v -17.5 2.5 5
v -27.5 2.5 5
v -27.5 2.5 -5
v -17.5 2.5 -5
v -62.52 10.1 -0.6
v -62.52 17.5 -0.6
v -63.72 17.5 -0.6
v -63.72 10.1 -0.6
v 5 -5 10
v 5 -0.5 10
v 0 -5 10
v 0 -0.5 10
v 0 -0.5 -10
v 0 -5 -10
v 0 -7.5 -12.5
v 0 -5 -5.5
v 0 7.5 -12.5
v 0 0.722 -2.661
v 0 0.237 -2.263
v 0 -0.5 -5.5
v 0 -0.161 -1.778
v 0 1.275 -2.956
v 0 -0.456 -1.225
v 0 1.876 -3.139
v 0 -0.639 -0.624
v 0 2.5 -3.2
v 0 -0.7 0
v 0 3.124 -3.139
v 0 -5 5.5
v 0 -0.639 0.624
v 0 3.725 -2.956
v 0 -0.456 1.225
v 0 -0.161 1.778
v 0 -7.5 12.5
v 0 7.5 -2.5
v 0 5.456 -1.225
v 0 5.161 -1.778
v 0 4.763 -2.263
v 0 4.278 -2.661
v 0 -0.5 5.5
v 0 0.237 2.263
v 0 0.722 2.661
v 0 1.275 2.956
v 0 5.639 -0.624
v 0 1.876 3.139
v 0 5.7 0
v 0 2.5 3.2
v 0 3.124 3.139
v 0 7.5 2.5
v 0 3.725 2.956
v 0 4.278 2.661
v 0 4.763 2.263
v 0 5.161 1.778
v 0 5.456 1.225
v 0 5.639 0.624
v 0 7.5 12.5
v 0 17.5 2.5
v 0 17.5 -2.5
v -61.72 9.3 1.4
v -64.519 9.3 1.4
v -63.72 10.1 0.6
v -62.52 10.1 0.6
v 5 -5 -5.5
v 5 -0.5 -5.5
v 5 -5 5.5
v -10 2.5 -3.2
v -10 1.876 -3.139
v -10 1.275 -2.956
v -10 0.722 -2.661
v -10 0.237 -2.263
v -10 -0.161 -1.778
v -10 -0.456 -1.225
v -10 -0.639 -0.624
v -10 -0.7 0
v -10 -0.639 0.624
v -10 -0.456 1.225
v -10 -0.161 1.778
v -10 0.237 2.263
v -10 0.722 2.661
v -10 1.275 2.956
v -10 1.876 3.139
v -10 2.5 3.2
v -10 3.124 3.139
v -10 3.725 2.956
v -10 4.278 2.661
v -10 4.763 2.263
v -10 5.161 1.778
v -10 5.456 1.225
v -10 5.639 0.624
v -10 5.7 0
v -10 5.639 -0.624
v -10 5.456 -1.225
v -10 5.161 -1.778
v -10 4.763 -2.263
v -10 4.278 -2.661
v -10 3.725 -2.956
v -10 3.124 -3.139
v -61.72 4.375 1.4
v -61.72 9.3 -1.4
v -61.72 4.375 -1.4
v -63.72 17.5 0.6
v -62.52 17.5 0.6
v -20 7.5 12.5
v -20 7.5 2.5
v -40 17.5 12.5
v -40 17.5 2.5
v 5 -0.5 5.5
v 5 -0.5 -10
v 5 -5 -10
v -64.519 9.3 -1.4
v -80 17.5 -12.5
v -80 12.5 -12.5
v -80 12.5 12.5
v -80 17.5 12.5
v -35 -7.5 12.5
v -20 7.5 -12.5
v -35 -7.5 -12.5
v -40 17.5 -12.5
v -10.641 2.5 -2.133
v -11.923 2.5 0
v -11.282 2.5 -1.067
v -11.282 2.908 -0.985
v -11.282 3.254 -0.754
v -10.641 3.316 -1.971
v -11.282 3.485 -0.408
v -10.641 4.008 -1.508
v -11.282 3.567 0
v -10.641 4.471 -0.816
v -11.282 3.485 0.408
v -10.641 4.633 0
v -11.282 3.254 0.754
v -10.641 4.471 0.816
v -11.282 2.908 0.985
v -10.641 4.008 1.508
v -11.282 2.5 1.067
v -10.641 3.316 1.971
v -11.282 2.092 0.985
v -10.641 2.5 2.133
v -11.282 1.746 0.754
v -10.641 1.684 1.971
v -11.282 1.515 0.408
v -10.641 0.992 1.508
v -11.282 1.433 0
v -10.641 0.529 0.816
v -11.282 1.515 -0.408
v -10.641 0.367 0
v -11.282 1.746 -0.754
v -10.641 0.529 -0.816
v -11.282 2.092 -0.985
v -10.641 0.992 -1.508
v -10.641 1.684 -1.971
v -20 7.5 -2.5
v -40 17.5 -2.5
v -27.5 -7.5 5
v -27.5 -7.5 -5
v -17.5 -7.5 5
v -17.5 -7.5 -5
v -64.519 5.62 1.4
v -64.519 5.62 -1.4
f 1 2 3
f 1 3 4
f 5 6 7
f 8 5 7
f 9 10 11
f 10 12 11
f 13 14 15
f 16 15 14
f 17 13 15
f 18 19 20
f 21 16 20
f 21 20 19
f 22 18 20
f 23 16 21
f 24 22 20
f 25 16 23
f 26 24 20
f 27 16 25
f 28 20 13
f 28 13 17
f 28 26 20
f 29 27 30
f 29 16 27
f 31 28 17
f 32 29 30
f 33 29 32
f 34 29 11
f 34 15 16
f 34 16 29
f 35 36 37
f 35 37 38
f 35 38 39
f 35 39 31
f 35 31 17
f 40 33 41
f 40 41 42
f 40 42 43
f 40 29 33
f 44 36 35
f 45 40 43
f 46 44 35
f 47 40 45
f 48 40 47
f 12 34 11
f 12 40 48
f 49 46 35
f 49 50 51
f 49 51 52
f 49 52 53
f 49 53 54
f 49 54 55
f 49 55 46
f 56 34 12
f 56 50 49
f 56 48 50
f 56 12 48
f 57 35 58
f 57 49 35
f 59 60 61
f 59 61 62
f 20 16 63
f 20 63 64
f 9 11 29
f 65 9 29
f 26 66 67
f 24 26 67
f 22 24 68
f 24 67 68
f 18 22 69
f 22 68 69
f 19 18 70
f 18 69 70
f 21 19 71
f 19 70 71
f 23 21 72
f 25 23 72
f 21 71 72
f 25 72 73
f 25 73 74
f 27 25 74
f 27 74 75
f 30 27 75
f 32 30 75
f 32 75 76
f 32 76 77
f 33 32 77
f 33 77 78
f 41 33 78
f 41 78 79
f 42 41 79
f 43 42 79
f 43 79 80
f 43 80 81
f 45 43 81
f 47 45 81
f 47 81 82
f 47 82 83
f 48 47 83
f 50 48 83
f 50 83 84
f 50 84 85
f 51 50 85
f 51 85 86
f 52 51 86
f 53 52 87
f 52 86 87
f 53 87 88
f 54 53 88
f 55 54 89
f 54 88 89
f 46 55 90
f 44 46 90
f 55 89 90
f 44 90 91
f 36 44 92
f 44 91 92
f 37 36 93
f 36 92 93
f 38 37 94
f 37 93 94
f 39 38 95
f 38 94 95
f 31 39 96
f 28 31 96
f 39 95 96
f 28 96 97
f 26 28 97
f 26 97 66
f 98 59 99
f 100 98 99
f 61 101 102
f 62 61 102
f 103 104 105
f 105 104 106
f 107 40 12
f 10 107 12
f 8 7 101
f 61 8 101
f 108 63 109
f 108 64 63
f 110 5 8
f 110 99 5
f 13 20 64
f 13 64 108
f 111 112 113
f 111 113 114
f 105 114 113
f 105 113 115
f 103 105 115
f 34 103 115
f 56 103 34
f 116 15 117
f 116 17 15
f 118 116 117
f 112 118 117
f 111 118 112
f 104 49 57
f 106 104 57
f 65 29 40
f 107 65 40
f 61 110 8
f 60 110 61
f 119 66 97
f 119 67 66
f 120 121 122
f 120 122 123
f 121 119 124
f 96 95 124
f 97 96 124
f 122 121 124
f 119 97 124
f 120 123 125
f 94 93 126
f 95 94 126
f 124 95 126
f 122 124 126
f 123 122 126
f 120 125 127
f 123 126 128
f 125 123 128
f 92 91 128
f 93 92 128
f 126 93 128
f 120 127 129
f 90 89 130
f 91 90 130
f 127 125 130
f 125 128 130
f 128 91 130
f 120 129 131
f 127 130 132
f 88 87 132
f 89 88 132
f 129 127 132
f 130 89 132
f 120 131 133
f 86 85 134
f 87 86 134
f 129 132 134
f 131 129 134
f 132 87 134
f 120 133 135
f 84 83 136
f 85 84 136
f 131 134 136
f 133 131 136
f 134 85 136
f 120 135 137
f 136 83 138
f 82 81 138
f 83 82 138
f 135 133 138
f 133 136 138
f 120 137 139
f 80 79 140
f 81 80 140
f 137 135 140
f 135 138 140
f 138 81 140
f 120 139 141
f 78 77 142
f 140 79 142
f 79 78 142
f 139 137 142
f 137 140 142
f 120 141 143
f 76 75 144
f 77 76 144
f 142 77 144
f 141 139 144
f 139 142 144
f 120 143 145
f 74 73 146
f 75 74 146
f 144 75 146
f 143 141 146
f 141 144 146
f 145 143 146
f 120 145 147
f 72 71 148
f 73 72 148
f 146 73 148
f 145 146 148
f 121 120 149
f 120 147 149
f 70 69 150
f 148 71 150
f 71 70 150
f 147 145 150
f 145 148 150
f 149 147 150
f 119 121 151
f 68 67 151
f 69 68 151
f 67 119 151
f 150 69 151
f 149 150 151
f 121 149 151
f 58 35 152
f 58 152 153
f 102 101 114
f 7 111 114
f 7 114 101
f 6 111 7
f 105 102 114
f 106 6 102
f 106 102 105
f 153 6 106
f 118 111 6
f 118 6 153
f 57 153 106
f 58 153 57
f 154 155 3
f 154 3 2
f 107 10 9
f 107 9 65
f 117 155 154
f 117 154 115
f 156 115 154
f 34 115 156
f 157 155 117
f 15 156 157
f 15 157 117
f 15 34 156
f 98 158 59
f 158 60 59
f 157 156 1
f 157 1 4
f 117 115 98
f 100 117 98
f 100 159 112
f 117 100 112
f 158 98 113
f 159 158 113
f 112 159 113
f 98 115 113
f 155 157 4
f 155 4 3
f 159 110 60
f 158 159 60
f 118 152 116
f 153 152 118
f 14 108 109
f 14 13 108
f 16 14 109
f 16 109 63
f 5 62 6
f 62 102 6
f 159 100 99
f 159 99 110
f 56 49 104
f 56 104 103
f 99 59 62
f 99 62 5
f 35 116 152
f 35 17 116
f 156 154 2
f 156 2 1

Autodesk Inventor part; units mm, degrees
ref_plane "YZ Plane" through (0, 0, 0) normal (1, 0, 0) x (0, 1, 0)
ref_plane "XZ Plane" through (0, 0, 0) normal (0, 1, 0) x (-1, 0, 0)
ref_plane "XY Plane" through (0, 0, 0) normal (0, 0, 1) x (1, 0, 0)
sketch "Sketch1" plane through (0, 0, 0) normal (1, 0, 0) x (0, 1, 0)
  line L0 (-7.5, -12.5) -> (7.5, -12.5)
  line L1 (7.5, -12.5) -> (7.5, 12.5)
  line L2 (7.5, 12.5) -> (-7.5, 12.5)
  line L3 (-7.5, 12.5) -> (-7.5, -12.5)
  line L4 (-7.5, -12.5) -> (7.5, 12.5) construction
  line L5 (7.5, -12.5) -> (-7.5, 12.5) construction
  point P0 (0, 0)
  dimension "d0" = 15
  dimension "d1" = 25
extrude "Extrusion1" add sketch "Sketch1" against normal blind 80
sketch "Sketch2" plane through (0, 0, 0) normal (1, 0, 0) x (0, 0, -1)
  line L0 (-12.5, 7.5) -> (12.5, 7.5) projected
  line L1 (0, 7.5) -> (2.5, 7.5)
  line L2 (2.5, 7.5) -> (2.5, 17.5)
  line L3 (2.5, 17.5) -> (0, 17.5)
  line L4 (0, 17.5) -> (0, 7.5)
  line L5 (0, 7.5) -> (-2.5, 7.5)
  line L6 (-2.5, 7.5) -> (-2.5, 17.5)
  line L7 (-2.5, 17.5) -> (0, 17.5)
  line L8 (0, 17.5) -> (0, 7.5)
  point P0 (0, 0)
  dimension "d4" = 2.5
  dimension "d5" = 10
  dimension "d6" = 2.5
  dimension "d7" = 10
extrude "Extrusion2" add sketch "Sketch2" against normal blind 80
sketch "Sketch4" plane through (0, 7.5, -2.5) normal (0, 0, -1) x (-1, 0, 0)
  line L0 (80, -15) -> (80, 0) projected
  line L1 (80, 0) -> (40, 0)
  line L2 (40, 0) -> (40, 10)
  line L3 (40, 10) -> (80, 10)
  line L4 (80, 10) -> (80, 0)
  point P0 (0, -7.5)
  dimension "d12" = 40
extrude "Extrusion3" add sketch "Sketch4" along normal blind 10
sketch "Sketch5" plane through (0, 7.5, -2.5) normal (0, 0, -1) x (-1, 0, 0)
  line L0 (0, 0) -> (80, 0) projected
  line L1 (40, 0) -> (20, 0)
  line L2 (20, 0) -> (40, 10)
  line L3 (40, 10) -> (40, 0)
  point P0 (0, -7.5)
  dimension "d15" = 20
extrude "Extrusion4" add sketch "Sketch5" along normal blind 10
sketch "Sketch6" plane through (0, 7.5, 2.5) normal (0, 0, 1) x (1, 0, 0)
  line L0 (-80, 10) -> (-40, 10)
  line L1 (-40, 10) -> (-40, 0)
  line L2 (-40, 0) -> (-80, 0)
  line L3 (-80, 0) -> (-80, 10)
  point P0 (0, -7.5)
extrude "Extrusion5" add sketch "Sketch6" along normal blind 10
sketch "Sketch7" plane through (0, 7.5, 2.5) normal (0, 0, 1) x (1, 0, 0)
  line L0 (-40, 10) -> (-40, 0) projected
  line L1 (-40, 0) -> (-20, 0)
  line L2 (0, 0) -> (-40, 0) projected
  line L3 (0, 10) -> (-40, 10) projected
  line L4 (-20, 0) -> (-40, 10)
  line L5 (-40, 10) -> (-40, 0)
  point P0 (0, -7.5)
  dimension "d20" = 20
extrude "Extrusion6" add sketch "Sketch7" along normal blind 10
sketch "Sketch8" plane through (0, -7.5, 12.5) normal (0, 0, 1) x (1, 0, 0)
  line L0 (0, 0) -> (-80, 0) projected
  line L1 (-80, 0) -> (-80, 20)
  line L2 (-80, 0) -> (-80, 25) projected
  line L3 (-80, 0) -> (-35, 0)
  line L4 (-35, 0) -> (-80, 20)
  point P0 (0, 7.5)
  dimension "d23" = 20
  dimension "d24" = 45
extrude "Extrusion7" cut sketch "Sketch8" against normal blind 25
sketch "Sketch21" plane through (0, 17.5, 2.5) normal (0, 1, 0) x (1, 0, 0)
  line L0 (-62.5195, 3.1) -> (-63.7195, 3.1)
  line L1 (-63.7195, 3.1) -> (-63.7195, 1.9)
  line L2 (-63.7195, 1.9) -> (-62.5195, 1.9)
  line L3 (-62.5195, 1.9) -> (-62.5195, 3.1)
  line L4 (-62.5195, 3.1) -> (-63.7195, 1.9) construction
  line L5 (-63.7195, 3.1) -> (-62.5195, 1.9) construction
  point P0 (0, 2.5)
  point P1 (-63.1195, 2.5)
  dimension "d63" = 1.2
  dimension "d64" = 1.2
extrude "Extrusion15" cut sketch "Sketch21" against normal blind 8.2
sketch "Sketch28" plane through (0, -7.5, -12.5) normal (0, -1, 0) x (1, 0, 0)
  line L0 (-17.5, 7.5) -> (-27.5, 7.5)
  line L1 (-27.5, 7.5) -> (-27.5, 17.5)
  line L2 (-27.5, 17.5) -> (-17.5, 17.5)
  line L3 (-17.5, 17.5) -> (-17.5, 7.5)
  line L4 (-17.5, 7.5) -> (-27.5, 17.5) construction
  line L5 (-27.5, 7.5) -> (-17.5, 17.5) construction
  point P0 (0, 12.5)
  point P1 (-22.5, 12.5)
  dimension "d86" = 10
  dimension "d87" = 10
extrude "Extrusion18" cut sketch "Sketch28" against normal blind 10
sketch "Sketch30" plane through (0, 0, 0) normal (1, 0, 0) x (0, 0, -1)
  line L0 (-12.5, -7.5) -> (12.5, -7.5) projected
  line L1 (0, -7.5) -> (0, 2.5)
  point P0 (0, 0)
  dimension "d90" = 10
hole "Hole1" at (0, 2.5, 0) direction (-1, 0, 0) diameter 6.4 depth 10 tip angle 118
sketch "Sketch31" plane through (0, 9.3, 2.5) normal (0, 1, 0) x (1, 0, 0)
  line L0 (-64.5195, 1.1) -> (-61.7195, 1.1)
  line L1 (-61.7195, 1.1) -> (-61.7195, 3.9)
  line L2 (-61.7195, 3.9) -> (-64.5195, 3.9)
  line L3 (-64.5195, 3.9) -> (-64.5195, 1.1)
  line L4 (-64.5195, 1.1) -> (-61.7195, 3.9) construction
  line L5 (-61.7195, 1.1) -> (-64.5195, 3.9) construction
  point P0 (0, 2.5)
  point P1 (-63.1195, 2.5)
  dimension "d98" = 2.8
  dimension "d99" = 2.8
extrude "Extrusion19" cut sketch "Sketch31" against normal through all
chamfer "Chamfer3" distance 0.8 angle 45 4 edges at (-62.5195, 9.3, 0) (-63.1195, 9.3, -0.6) (-63.1195, 9.3, 0.6) (-63.7195, 9.3, 0)
sketch "Sketch32" plane through (0, 0, 0) normal (1, 0, 0) x (0, 0, -1)
  line L0 (-12.5, -7.5) -> (12.5, -7.5) projected
  line L1 (-12.5, -7.5) -> (-10, -7.5)
  line L2 (-10, -7.5) -> (-10, -5)
  line L3 (-10, -5) -> (-12.5, -5)
  line L4 (-12.5, -5) -> (-12.5, -7.5)
  line L5 (-10, -5) -> (-5.5, -5)
  line L6 (-5.5, -5) -> (-5.5, -0.5)
  line L7 (-5.5, -0.5) -> (-10, -0.5)
  line L8 (-10, -0.5) -> (-10, -5)
  point P0 (0, 0)
  dimension "d105" = 2.5
  dimension "d106" = 2.5
  dimension "d107" = 4.5
  dimension "d108" = 4.5
extrude "Extrusion20" add sketch "Sketch32" along normal blind 5 contours L8 L7 L6 L5
sketch "Sketch33" plane through (0, 0, 0) normal (1, 0, 0) x (0, 0, -1)
  line L0 (12.5, -7.5) -> (12.5, 12.5) projected
  line L1 (12.5, -7.5) -> (10, -7.5)
  line L2 (10, -7.5) -> (10, -5)
  line L3 (10, -5) -> (12.5, -5)
  line L4 (12.5, -5) -> (12.5, -7.5)
  line L5 (10, -5) -> (5.5, -5)
  line L6 (5.5, -5) -> (5.5, -0.5)
  line L7 (5.5, -0.5) -> (10, -0.5)
  line L8 (10, -0.5) -> (10, -5)
  point P0 (0, 0)
  dimension "d111" = 2.5
  dimension "d112" = 2.5
  dimension "d113" = 4.5
  dimension "d114" = 4.5
extrude "Extrusion21" add sketch "Sketch33" along normal blind 5 contours L5 L6 L7 L8
properties part number "end"
